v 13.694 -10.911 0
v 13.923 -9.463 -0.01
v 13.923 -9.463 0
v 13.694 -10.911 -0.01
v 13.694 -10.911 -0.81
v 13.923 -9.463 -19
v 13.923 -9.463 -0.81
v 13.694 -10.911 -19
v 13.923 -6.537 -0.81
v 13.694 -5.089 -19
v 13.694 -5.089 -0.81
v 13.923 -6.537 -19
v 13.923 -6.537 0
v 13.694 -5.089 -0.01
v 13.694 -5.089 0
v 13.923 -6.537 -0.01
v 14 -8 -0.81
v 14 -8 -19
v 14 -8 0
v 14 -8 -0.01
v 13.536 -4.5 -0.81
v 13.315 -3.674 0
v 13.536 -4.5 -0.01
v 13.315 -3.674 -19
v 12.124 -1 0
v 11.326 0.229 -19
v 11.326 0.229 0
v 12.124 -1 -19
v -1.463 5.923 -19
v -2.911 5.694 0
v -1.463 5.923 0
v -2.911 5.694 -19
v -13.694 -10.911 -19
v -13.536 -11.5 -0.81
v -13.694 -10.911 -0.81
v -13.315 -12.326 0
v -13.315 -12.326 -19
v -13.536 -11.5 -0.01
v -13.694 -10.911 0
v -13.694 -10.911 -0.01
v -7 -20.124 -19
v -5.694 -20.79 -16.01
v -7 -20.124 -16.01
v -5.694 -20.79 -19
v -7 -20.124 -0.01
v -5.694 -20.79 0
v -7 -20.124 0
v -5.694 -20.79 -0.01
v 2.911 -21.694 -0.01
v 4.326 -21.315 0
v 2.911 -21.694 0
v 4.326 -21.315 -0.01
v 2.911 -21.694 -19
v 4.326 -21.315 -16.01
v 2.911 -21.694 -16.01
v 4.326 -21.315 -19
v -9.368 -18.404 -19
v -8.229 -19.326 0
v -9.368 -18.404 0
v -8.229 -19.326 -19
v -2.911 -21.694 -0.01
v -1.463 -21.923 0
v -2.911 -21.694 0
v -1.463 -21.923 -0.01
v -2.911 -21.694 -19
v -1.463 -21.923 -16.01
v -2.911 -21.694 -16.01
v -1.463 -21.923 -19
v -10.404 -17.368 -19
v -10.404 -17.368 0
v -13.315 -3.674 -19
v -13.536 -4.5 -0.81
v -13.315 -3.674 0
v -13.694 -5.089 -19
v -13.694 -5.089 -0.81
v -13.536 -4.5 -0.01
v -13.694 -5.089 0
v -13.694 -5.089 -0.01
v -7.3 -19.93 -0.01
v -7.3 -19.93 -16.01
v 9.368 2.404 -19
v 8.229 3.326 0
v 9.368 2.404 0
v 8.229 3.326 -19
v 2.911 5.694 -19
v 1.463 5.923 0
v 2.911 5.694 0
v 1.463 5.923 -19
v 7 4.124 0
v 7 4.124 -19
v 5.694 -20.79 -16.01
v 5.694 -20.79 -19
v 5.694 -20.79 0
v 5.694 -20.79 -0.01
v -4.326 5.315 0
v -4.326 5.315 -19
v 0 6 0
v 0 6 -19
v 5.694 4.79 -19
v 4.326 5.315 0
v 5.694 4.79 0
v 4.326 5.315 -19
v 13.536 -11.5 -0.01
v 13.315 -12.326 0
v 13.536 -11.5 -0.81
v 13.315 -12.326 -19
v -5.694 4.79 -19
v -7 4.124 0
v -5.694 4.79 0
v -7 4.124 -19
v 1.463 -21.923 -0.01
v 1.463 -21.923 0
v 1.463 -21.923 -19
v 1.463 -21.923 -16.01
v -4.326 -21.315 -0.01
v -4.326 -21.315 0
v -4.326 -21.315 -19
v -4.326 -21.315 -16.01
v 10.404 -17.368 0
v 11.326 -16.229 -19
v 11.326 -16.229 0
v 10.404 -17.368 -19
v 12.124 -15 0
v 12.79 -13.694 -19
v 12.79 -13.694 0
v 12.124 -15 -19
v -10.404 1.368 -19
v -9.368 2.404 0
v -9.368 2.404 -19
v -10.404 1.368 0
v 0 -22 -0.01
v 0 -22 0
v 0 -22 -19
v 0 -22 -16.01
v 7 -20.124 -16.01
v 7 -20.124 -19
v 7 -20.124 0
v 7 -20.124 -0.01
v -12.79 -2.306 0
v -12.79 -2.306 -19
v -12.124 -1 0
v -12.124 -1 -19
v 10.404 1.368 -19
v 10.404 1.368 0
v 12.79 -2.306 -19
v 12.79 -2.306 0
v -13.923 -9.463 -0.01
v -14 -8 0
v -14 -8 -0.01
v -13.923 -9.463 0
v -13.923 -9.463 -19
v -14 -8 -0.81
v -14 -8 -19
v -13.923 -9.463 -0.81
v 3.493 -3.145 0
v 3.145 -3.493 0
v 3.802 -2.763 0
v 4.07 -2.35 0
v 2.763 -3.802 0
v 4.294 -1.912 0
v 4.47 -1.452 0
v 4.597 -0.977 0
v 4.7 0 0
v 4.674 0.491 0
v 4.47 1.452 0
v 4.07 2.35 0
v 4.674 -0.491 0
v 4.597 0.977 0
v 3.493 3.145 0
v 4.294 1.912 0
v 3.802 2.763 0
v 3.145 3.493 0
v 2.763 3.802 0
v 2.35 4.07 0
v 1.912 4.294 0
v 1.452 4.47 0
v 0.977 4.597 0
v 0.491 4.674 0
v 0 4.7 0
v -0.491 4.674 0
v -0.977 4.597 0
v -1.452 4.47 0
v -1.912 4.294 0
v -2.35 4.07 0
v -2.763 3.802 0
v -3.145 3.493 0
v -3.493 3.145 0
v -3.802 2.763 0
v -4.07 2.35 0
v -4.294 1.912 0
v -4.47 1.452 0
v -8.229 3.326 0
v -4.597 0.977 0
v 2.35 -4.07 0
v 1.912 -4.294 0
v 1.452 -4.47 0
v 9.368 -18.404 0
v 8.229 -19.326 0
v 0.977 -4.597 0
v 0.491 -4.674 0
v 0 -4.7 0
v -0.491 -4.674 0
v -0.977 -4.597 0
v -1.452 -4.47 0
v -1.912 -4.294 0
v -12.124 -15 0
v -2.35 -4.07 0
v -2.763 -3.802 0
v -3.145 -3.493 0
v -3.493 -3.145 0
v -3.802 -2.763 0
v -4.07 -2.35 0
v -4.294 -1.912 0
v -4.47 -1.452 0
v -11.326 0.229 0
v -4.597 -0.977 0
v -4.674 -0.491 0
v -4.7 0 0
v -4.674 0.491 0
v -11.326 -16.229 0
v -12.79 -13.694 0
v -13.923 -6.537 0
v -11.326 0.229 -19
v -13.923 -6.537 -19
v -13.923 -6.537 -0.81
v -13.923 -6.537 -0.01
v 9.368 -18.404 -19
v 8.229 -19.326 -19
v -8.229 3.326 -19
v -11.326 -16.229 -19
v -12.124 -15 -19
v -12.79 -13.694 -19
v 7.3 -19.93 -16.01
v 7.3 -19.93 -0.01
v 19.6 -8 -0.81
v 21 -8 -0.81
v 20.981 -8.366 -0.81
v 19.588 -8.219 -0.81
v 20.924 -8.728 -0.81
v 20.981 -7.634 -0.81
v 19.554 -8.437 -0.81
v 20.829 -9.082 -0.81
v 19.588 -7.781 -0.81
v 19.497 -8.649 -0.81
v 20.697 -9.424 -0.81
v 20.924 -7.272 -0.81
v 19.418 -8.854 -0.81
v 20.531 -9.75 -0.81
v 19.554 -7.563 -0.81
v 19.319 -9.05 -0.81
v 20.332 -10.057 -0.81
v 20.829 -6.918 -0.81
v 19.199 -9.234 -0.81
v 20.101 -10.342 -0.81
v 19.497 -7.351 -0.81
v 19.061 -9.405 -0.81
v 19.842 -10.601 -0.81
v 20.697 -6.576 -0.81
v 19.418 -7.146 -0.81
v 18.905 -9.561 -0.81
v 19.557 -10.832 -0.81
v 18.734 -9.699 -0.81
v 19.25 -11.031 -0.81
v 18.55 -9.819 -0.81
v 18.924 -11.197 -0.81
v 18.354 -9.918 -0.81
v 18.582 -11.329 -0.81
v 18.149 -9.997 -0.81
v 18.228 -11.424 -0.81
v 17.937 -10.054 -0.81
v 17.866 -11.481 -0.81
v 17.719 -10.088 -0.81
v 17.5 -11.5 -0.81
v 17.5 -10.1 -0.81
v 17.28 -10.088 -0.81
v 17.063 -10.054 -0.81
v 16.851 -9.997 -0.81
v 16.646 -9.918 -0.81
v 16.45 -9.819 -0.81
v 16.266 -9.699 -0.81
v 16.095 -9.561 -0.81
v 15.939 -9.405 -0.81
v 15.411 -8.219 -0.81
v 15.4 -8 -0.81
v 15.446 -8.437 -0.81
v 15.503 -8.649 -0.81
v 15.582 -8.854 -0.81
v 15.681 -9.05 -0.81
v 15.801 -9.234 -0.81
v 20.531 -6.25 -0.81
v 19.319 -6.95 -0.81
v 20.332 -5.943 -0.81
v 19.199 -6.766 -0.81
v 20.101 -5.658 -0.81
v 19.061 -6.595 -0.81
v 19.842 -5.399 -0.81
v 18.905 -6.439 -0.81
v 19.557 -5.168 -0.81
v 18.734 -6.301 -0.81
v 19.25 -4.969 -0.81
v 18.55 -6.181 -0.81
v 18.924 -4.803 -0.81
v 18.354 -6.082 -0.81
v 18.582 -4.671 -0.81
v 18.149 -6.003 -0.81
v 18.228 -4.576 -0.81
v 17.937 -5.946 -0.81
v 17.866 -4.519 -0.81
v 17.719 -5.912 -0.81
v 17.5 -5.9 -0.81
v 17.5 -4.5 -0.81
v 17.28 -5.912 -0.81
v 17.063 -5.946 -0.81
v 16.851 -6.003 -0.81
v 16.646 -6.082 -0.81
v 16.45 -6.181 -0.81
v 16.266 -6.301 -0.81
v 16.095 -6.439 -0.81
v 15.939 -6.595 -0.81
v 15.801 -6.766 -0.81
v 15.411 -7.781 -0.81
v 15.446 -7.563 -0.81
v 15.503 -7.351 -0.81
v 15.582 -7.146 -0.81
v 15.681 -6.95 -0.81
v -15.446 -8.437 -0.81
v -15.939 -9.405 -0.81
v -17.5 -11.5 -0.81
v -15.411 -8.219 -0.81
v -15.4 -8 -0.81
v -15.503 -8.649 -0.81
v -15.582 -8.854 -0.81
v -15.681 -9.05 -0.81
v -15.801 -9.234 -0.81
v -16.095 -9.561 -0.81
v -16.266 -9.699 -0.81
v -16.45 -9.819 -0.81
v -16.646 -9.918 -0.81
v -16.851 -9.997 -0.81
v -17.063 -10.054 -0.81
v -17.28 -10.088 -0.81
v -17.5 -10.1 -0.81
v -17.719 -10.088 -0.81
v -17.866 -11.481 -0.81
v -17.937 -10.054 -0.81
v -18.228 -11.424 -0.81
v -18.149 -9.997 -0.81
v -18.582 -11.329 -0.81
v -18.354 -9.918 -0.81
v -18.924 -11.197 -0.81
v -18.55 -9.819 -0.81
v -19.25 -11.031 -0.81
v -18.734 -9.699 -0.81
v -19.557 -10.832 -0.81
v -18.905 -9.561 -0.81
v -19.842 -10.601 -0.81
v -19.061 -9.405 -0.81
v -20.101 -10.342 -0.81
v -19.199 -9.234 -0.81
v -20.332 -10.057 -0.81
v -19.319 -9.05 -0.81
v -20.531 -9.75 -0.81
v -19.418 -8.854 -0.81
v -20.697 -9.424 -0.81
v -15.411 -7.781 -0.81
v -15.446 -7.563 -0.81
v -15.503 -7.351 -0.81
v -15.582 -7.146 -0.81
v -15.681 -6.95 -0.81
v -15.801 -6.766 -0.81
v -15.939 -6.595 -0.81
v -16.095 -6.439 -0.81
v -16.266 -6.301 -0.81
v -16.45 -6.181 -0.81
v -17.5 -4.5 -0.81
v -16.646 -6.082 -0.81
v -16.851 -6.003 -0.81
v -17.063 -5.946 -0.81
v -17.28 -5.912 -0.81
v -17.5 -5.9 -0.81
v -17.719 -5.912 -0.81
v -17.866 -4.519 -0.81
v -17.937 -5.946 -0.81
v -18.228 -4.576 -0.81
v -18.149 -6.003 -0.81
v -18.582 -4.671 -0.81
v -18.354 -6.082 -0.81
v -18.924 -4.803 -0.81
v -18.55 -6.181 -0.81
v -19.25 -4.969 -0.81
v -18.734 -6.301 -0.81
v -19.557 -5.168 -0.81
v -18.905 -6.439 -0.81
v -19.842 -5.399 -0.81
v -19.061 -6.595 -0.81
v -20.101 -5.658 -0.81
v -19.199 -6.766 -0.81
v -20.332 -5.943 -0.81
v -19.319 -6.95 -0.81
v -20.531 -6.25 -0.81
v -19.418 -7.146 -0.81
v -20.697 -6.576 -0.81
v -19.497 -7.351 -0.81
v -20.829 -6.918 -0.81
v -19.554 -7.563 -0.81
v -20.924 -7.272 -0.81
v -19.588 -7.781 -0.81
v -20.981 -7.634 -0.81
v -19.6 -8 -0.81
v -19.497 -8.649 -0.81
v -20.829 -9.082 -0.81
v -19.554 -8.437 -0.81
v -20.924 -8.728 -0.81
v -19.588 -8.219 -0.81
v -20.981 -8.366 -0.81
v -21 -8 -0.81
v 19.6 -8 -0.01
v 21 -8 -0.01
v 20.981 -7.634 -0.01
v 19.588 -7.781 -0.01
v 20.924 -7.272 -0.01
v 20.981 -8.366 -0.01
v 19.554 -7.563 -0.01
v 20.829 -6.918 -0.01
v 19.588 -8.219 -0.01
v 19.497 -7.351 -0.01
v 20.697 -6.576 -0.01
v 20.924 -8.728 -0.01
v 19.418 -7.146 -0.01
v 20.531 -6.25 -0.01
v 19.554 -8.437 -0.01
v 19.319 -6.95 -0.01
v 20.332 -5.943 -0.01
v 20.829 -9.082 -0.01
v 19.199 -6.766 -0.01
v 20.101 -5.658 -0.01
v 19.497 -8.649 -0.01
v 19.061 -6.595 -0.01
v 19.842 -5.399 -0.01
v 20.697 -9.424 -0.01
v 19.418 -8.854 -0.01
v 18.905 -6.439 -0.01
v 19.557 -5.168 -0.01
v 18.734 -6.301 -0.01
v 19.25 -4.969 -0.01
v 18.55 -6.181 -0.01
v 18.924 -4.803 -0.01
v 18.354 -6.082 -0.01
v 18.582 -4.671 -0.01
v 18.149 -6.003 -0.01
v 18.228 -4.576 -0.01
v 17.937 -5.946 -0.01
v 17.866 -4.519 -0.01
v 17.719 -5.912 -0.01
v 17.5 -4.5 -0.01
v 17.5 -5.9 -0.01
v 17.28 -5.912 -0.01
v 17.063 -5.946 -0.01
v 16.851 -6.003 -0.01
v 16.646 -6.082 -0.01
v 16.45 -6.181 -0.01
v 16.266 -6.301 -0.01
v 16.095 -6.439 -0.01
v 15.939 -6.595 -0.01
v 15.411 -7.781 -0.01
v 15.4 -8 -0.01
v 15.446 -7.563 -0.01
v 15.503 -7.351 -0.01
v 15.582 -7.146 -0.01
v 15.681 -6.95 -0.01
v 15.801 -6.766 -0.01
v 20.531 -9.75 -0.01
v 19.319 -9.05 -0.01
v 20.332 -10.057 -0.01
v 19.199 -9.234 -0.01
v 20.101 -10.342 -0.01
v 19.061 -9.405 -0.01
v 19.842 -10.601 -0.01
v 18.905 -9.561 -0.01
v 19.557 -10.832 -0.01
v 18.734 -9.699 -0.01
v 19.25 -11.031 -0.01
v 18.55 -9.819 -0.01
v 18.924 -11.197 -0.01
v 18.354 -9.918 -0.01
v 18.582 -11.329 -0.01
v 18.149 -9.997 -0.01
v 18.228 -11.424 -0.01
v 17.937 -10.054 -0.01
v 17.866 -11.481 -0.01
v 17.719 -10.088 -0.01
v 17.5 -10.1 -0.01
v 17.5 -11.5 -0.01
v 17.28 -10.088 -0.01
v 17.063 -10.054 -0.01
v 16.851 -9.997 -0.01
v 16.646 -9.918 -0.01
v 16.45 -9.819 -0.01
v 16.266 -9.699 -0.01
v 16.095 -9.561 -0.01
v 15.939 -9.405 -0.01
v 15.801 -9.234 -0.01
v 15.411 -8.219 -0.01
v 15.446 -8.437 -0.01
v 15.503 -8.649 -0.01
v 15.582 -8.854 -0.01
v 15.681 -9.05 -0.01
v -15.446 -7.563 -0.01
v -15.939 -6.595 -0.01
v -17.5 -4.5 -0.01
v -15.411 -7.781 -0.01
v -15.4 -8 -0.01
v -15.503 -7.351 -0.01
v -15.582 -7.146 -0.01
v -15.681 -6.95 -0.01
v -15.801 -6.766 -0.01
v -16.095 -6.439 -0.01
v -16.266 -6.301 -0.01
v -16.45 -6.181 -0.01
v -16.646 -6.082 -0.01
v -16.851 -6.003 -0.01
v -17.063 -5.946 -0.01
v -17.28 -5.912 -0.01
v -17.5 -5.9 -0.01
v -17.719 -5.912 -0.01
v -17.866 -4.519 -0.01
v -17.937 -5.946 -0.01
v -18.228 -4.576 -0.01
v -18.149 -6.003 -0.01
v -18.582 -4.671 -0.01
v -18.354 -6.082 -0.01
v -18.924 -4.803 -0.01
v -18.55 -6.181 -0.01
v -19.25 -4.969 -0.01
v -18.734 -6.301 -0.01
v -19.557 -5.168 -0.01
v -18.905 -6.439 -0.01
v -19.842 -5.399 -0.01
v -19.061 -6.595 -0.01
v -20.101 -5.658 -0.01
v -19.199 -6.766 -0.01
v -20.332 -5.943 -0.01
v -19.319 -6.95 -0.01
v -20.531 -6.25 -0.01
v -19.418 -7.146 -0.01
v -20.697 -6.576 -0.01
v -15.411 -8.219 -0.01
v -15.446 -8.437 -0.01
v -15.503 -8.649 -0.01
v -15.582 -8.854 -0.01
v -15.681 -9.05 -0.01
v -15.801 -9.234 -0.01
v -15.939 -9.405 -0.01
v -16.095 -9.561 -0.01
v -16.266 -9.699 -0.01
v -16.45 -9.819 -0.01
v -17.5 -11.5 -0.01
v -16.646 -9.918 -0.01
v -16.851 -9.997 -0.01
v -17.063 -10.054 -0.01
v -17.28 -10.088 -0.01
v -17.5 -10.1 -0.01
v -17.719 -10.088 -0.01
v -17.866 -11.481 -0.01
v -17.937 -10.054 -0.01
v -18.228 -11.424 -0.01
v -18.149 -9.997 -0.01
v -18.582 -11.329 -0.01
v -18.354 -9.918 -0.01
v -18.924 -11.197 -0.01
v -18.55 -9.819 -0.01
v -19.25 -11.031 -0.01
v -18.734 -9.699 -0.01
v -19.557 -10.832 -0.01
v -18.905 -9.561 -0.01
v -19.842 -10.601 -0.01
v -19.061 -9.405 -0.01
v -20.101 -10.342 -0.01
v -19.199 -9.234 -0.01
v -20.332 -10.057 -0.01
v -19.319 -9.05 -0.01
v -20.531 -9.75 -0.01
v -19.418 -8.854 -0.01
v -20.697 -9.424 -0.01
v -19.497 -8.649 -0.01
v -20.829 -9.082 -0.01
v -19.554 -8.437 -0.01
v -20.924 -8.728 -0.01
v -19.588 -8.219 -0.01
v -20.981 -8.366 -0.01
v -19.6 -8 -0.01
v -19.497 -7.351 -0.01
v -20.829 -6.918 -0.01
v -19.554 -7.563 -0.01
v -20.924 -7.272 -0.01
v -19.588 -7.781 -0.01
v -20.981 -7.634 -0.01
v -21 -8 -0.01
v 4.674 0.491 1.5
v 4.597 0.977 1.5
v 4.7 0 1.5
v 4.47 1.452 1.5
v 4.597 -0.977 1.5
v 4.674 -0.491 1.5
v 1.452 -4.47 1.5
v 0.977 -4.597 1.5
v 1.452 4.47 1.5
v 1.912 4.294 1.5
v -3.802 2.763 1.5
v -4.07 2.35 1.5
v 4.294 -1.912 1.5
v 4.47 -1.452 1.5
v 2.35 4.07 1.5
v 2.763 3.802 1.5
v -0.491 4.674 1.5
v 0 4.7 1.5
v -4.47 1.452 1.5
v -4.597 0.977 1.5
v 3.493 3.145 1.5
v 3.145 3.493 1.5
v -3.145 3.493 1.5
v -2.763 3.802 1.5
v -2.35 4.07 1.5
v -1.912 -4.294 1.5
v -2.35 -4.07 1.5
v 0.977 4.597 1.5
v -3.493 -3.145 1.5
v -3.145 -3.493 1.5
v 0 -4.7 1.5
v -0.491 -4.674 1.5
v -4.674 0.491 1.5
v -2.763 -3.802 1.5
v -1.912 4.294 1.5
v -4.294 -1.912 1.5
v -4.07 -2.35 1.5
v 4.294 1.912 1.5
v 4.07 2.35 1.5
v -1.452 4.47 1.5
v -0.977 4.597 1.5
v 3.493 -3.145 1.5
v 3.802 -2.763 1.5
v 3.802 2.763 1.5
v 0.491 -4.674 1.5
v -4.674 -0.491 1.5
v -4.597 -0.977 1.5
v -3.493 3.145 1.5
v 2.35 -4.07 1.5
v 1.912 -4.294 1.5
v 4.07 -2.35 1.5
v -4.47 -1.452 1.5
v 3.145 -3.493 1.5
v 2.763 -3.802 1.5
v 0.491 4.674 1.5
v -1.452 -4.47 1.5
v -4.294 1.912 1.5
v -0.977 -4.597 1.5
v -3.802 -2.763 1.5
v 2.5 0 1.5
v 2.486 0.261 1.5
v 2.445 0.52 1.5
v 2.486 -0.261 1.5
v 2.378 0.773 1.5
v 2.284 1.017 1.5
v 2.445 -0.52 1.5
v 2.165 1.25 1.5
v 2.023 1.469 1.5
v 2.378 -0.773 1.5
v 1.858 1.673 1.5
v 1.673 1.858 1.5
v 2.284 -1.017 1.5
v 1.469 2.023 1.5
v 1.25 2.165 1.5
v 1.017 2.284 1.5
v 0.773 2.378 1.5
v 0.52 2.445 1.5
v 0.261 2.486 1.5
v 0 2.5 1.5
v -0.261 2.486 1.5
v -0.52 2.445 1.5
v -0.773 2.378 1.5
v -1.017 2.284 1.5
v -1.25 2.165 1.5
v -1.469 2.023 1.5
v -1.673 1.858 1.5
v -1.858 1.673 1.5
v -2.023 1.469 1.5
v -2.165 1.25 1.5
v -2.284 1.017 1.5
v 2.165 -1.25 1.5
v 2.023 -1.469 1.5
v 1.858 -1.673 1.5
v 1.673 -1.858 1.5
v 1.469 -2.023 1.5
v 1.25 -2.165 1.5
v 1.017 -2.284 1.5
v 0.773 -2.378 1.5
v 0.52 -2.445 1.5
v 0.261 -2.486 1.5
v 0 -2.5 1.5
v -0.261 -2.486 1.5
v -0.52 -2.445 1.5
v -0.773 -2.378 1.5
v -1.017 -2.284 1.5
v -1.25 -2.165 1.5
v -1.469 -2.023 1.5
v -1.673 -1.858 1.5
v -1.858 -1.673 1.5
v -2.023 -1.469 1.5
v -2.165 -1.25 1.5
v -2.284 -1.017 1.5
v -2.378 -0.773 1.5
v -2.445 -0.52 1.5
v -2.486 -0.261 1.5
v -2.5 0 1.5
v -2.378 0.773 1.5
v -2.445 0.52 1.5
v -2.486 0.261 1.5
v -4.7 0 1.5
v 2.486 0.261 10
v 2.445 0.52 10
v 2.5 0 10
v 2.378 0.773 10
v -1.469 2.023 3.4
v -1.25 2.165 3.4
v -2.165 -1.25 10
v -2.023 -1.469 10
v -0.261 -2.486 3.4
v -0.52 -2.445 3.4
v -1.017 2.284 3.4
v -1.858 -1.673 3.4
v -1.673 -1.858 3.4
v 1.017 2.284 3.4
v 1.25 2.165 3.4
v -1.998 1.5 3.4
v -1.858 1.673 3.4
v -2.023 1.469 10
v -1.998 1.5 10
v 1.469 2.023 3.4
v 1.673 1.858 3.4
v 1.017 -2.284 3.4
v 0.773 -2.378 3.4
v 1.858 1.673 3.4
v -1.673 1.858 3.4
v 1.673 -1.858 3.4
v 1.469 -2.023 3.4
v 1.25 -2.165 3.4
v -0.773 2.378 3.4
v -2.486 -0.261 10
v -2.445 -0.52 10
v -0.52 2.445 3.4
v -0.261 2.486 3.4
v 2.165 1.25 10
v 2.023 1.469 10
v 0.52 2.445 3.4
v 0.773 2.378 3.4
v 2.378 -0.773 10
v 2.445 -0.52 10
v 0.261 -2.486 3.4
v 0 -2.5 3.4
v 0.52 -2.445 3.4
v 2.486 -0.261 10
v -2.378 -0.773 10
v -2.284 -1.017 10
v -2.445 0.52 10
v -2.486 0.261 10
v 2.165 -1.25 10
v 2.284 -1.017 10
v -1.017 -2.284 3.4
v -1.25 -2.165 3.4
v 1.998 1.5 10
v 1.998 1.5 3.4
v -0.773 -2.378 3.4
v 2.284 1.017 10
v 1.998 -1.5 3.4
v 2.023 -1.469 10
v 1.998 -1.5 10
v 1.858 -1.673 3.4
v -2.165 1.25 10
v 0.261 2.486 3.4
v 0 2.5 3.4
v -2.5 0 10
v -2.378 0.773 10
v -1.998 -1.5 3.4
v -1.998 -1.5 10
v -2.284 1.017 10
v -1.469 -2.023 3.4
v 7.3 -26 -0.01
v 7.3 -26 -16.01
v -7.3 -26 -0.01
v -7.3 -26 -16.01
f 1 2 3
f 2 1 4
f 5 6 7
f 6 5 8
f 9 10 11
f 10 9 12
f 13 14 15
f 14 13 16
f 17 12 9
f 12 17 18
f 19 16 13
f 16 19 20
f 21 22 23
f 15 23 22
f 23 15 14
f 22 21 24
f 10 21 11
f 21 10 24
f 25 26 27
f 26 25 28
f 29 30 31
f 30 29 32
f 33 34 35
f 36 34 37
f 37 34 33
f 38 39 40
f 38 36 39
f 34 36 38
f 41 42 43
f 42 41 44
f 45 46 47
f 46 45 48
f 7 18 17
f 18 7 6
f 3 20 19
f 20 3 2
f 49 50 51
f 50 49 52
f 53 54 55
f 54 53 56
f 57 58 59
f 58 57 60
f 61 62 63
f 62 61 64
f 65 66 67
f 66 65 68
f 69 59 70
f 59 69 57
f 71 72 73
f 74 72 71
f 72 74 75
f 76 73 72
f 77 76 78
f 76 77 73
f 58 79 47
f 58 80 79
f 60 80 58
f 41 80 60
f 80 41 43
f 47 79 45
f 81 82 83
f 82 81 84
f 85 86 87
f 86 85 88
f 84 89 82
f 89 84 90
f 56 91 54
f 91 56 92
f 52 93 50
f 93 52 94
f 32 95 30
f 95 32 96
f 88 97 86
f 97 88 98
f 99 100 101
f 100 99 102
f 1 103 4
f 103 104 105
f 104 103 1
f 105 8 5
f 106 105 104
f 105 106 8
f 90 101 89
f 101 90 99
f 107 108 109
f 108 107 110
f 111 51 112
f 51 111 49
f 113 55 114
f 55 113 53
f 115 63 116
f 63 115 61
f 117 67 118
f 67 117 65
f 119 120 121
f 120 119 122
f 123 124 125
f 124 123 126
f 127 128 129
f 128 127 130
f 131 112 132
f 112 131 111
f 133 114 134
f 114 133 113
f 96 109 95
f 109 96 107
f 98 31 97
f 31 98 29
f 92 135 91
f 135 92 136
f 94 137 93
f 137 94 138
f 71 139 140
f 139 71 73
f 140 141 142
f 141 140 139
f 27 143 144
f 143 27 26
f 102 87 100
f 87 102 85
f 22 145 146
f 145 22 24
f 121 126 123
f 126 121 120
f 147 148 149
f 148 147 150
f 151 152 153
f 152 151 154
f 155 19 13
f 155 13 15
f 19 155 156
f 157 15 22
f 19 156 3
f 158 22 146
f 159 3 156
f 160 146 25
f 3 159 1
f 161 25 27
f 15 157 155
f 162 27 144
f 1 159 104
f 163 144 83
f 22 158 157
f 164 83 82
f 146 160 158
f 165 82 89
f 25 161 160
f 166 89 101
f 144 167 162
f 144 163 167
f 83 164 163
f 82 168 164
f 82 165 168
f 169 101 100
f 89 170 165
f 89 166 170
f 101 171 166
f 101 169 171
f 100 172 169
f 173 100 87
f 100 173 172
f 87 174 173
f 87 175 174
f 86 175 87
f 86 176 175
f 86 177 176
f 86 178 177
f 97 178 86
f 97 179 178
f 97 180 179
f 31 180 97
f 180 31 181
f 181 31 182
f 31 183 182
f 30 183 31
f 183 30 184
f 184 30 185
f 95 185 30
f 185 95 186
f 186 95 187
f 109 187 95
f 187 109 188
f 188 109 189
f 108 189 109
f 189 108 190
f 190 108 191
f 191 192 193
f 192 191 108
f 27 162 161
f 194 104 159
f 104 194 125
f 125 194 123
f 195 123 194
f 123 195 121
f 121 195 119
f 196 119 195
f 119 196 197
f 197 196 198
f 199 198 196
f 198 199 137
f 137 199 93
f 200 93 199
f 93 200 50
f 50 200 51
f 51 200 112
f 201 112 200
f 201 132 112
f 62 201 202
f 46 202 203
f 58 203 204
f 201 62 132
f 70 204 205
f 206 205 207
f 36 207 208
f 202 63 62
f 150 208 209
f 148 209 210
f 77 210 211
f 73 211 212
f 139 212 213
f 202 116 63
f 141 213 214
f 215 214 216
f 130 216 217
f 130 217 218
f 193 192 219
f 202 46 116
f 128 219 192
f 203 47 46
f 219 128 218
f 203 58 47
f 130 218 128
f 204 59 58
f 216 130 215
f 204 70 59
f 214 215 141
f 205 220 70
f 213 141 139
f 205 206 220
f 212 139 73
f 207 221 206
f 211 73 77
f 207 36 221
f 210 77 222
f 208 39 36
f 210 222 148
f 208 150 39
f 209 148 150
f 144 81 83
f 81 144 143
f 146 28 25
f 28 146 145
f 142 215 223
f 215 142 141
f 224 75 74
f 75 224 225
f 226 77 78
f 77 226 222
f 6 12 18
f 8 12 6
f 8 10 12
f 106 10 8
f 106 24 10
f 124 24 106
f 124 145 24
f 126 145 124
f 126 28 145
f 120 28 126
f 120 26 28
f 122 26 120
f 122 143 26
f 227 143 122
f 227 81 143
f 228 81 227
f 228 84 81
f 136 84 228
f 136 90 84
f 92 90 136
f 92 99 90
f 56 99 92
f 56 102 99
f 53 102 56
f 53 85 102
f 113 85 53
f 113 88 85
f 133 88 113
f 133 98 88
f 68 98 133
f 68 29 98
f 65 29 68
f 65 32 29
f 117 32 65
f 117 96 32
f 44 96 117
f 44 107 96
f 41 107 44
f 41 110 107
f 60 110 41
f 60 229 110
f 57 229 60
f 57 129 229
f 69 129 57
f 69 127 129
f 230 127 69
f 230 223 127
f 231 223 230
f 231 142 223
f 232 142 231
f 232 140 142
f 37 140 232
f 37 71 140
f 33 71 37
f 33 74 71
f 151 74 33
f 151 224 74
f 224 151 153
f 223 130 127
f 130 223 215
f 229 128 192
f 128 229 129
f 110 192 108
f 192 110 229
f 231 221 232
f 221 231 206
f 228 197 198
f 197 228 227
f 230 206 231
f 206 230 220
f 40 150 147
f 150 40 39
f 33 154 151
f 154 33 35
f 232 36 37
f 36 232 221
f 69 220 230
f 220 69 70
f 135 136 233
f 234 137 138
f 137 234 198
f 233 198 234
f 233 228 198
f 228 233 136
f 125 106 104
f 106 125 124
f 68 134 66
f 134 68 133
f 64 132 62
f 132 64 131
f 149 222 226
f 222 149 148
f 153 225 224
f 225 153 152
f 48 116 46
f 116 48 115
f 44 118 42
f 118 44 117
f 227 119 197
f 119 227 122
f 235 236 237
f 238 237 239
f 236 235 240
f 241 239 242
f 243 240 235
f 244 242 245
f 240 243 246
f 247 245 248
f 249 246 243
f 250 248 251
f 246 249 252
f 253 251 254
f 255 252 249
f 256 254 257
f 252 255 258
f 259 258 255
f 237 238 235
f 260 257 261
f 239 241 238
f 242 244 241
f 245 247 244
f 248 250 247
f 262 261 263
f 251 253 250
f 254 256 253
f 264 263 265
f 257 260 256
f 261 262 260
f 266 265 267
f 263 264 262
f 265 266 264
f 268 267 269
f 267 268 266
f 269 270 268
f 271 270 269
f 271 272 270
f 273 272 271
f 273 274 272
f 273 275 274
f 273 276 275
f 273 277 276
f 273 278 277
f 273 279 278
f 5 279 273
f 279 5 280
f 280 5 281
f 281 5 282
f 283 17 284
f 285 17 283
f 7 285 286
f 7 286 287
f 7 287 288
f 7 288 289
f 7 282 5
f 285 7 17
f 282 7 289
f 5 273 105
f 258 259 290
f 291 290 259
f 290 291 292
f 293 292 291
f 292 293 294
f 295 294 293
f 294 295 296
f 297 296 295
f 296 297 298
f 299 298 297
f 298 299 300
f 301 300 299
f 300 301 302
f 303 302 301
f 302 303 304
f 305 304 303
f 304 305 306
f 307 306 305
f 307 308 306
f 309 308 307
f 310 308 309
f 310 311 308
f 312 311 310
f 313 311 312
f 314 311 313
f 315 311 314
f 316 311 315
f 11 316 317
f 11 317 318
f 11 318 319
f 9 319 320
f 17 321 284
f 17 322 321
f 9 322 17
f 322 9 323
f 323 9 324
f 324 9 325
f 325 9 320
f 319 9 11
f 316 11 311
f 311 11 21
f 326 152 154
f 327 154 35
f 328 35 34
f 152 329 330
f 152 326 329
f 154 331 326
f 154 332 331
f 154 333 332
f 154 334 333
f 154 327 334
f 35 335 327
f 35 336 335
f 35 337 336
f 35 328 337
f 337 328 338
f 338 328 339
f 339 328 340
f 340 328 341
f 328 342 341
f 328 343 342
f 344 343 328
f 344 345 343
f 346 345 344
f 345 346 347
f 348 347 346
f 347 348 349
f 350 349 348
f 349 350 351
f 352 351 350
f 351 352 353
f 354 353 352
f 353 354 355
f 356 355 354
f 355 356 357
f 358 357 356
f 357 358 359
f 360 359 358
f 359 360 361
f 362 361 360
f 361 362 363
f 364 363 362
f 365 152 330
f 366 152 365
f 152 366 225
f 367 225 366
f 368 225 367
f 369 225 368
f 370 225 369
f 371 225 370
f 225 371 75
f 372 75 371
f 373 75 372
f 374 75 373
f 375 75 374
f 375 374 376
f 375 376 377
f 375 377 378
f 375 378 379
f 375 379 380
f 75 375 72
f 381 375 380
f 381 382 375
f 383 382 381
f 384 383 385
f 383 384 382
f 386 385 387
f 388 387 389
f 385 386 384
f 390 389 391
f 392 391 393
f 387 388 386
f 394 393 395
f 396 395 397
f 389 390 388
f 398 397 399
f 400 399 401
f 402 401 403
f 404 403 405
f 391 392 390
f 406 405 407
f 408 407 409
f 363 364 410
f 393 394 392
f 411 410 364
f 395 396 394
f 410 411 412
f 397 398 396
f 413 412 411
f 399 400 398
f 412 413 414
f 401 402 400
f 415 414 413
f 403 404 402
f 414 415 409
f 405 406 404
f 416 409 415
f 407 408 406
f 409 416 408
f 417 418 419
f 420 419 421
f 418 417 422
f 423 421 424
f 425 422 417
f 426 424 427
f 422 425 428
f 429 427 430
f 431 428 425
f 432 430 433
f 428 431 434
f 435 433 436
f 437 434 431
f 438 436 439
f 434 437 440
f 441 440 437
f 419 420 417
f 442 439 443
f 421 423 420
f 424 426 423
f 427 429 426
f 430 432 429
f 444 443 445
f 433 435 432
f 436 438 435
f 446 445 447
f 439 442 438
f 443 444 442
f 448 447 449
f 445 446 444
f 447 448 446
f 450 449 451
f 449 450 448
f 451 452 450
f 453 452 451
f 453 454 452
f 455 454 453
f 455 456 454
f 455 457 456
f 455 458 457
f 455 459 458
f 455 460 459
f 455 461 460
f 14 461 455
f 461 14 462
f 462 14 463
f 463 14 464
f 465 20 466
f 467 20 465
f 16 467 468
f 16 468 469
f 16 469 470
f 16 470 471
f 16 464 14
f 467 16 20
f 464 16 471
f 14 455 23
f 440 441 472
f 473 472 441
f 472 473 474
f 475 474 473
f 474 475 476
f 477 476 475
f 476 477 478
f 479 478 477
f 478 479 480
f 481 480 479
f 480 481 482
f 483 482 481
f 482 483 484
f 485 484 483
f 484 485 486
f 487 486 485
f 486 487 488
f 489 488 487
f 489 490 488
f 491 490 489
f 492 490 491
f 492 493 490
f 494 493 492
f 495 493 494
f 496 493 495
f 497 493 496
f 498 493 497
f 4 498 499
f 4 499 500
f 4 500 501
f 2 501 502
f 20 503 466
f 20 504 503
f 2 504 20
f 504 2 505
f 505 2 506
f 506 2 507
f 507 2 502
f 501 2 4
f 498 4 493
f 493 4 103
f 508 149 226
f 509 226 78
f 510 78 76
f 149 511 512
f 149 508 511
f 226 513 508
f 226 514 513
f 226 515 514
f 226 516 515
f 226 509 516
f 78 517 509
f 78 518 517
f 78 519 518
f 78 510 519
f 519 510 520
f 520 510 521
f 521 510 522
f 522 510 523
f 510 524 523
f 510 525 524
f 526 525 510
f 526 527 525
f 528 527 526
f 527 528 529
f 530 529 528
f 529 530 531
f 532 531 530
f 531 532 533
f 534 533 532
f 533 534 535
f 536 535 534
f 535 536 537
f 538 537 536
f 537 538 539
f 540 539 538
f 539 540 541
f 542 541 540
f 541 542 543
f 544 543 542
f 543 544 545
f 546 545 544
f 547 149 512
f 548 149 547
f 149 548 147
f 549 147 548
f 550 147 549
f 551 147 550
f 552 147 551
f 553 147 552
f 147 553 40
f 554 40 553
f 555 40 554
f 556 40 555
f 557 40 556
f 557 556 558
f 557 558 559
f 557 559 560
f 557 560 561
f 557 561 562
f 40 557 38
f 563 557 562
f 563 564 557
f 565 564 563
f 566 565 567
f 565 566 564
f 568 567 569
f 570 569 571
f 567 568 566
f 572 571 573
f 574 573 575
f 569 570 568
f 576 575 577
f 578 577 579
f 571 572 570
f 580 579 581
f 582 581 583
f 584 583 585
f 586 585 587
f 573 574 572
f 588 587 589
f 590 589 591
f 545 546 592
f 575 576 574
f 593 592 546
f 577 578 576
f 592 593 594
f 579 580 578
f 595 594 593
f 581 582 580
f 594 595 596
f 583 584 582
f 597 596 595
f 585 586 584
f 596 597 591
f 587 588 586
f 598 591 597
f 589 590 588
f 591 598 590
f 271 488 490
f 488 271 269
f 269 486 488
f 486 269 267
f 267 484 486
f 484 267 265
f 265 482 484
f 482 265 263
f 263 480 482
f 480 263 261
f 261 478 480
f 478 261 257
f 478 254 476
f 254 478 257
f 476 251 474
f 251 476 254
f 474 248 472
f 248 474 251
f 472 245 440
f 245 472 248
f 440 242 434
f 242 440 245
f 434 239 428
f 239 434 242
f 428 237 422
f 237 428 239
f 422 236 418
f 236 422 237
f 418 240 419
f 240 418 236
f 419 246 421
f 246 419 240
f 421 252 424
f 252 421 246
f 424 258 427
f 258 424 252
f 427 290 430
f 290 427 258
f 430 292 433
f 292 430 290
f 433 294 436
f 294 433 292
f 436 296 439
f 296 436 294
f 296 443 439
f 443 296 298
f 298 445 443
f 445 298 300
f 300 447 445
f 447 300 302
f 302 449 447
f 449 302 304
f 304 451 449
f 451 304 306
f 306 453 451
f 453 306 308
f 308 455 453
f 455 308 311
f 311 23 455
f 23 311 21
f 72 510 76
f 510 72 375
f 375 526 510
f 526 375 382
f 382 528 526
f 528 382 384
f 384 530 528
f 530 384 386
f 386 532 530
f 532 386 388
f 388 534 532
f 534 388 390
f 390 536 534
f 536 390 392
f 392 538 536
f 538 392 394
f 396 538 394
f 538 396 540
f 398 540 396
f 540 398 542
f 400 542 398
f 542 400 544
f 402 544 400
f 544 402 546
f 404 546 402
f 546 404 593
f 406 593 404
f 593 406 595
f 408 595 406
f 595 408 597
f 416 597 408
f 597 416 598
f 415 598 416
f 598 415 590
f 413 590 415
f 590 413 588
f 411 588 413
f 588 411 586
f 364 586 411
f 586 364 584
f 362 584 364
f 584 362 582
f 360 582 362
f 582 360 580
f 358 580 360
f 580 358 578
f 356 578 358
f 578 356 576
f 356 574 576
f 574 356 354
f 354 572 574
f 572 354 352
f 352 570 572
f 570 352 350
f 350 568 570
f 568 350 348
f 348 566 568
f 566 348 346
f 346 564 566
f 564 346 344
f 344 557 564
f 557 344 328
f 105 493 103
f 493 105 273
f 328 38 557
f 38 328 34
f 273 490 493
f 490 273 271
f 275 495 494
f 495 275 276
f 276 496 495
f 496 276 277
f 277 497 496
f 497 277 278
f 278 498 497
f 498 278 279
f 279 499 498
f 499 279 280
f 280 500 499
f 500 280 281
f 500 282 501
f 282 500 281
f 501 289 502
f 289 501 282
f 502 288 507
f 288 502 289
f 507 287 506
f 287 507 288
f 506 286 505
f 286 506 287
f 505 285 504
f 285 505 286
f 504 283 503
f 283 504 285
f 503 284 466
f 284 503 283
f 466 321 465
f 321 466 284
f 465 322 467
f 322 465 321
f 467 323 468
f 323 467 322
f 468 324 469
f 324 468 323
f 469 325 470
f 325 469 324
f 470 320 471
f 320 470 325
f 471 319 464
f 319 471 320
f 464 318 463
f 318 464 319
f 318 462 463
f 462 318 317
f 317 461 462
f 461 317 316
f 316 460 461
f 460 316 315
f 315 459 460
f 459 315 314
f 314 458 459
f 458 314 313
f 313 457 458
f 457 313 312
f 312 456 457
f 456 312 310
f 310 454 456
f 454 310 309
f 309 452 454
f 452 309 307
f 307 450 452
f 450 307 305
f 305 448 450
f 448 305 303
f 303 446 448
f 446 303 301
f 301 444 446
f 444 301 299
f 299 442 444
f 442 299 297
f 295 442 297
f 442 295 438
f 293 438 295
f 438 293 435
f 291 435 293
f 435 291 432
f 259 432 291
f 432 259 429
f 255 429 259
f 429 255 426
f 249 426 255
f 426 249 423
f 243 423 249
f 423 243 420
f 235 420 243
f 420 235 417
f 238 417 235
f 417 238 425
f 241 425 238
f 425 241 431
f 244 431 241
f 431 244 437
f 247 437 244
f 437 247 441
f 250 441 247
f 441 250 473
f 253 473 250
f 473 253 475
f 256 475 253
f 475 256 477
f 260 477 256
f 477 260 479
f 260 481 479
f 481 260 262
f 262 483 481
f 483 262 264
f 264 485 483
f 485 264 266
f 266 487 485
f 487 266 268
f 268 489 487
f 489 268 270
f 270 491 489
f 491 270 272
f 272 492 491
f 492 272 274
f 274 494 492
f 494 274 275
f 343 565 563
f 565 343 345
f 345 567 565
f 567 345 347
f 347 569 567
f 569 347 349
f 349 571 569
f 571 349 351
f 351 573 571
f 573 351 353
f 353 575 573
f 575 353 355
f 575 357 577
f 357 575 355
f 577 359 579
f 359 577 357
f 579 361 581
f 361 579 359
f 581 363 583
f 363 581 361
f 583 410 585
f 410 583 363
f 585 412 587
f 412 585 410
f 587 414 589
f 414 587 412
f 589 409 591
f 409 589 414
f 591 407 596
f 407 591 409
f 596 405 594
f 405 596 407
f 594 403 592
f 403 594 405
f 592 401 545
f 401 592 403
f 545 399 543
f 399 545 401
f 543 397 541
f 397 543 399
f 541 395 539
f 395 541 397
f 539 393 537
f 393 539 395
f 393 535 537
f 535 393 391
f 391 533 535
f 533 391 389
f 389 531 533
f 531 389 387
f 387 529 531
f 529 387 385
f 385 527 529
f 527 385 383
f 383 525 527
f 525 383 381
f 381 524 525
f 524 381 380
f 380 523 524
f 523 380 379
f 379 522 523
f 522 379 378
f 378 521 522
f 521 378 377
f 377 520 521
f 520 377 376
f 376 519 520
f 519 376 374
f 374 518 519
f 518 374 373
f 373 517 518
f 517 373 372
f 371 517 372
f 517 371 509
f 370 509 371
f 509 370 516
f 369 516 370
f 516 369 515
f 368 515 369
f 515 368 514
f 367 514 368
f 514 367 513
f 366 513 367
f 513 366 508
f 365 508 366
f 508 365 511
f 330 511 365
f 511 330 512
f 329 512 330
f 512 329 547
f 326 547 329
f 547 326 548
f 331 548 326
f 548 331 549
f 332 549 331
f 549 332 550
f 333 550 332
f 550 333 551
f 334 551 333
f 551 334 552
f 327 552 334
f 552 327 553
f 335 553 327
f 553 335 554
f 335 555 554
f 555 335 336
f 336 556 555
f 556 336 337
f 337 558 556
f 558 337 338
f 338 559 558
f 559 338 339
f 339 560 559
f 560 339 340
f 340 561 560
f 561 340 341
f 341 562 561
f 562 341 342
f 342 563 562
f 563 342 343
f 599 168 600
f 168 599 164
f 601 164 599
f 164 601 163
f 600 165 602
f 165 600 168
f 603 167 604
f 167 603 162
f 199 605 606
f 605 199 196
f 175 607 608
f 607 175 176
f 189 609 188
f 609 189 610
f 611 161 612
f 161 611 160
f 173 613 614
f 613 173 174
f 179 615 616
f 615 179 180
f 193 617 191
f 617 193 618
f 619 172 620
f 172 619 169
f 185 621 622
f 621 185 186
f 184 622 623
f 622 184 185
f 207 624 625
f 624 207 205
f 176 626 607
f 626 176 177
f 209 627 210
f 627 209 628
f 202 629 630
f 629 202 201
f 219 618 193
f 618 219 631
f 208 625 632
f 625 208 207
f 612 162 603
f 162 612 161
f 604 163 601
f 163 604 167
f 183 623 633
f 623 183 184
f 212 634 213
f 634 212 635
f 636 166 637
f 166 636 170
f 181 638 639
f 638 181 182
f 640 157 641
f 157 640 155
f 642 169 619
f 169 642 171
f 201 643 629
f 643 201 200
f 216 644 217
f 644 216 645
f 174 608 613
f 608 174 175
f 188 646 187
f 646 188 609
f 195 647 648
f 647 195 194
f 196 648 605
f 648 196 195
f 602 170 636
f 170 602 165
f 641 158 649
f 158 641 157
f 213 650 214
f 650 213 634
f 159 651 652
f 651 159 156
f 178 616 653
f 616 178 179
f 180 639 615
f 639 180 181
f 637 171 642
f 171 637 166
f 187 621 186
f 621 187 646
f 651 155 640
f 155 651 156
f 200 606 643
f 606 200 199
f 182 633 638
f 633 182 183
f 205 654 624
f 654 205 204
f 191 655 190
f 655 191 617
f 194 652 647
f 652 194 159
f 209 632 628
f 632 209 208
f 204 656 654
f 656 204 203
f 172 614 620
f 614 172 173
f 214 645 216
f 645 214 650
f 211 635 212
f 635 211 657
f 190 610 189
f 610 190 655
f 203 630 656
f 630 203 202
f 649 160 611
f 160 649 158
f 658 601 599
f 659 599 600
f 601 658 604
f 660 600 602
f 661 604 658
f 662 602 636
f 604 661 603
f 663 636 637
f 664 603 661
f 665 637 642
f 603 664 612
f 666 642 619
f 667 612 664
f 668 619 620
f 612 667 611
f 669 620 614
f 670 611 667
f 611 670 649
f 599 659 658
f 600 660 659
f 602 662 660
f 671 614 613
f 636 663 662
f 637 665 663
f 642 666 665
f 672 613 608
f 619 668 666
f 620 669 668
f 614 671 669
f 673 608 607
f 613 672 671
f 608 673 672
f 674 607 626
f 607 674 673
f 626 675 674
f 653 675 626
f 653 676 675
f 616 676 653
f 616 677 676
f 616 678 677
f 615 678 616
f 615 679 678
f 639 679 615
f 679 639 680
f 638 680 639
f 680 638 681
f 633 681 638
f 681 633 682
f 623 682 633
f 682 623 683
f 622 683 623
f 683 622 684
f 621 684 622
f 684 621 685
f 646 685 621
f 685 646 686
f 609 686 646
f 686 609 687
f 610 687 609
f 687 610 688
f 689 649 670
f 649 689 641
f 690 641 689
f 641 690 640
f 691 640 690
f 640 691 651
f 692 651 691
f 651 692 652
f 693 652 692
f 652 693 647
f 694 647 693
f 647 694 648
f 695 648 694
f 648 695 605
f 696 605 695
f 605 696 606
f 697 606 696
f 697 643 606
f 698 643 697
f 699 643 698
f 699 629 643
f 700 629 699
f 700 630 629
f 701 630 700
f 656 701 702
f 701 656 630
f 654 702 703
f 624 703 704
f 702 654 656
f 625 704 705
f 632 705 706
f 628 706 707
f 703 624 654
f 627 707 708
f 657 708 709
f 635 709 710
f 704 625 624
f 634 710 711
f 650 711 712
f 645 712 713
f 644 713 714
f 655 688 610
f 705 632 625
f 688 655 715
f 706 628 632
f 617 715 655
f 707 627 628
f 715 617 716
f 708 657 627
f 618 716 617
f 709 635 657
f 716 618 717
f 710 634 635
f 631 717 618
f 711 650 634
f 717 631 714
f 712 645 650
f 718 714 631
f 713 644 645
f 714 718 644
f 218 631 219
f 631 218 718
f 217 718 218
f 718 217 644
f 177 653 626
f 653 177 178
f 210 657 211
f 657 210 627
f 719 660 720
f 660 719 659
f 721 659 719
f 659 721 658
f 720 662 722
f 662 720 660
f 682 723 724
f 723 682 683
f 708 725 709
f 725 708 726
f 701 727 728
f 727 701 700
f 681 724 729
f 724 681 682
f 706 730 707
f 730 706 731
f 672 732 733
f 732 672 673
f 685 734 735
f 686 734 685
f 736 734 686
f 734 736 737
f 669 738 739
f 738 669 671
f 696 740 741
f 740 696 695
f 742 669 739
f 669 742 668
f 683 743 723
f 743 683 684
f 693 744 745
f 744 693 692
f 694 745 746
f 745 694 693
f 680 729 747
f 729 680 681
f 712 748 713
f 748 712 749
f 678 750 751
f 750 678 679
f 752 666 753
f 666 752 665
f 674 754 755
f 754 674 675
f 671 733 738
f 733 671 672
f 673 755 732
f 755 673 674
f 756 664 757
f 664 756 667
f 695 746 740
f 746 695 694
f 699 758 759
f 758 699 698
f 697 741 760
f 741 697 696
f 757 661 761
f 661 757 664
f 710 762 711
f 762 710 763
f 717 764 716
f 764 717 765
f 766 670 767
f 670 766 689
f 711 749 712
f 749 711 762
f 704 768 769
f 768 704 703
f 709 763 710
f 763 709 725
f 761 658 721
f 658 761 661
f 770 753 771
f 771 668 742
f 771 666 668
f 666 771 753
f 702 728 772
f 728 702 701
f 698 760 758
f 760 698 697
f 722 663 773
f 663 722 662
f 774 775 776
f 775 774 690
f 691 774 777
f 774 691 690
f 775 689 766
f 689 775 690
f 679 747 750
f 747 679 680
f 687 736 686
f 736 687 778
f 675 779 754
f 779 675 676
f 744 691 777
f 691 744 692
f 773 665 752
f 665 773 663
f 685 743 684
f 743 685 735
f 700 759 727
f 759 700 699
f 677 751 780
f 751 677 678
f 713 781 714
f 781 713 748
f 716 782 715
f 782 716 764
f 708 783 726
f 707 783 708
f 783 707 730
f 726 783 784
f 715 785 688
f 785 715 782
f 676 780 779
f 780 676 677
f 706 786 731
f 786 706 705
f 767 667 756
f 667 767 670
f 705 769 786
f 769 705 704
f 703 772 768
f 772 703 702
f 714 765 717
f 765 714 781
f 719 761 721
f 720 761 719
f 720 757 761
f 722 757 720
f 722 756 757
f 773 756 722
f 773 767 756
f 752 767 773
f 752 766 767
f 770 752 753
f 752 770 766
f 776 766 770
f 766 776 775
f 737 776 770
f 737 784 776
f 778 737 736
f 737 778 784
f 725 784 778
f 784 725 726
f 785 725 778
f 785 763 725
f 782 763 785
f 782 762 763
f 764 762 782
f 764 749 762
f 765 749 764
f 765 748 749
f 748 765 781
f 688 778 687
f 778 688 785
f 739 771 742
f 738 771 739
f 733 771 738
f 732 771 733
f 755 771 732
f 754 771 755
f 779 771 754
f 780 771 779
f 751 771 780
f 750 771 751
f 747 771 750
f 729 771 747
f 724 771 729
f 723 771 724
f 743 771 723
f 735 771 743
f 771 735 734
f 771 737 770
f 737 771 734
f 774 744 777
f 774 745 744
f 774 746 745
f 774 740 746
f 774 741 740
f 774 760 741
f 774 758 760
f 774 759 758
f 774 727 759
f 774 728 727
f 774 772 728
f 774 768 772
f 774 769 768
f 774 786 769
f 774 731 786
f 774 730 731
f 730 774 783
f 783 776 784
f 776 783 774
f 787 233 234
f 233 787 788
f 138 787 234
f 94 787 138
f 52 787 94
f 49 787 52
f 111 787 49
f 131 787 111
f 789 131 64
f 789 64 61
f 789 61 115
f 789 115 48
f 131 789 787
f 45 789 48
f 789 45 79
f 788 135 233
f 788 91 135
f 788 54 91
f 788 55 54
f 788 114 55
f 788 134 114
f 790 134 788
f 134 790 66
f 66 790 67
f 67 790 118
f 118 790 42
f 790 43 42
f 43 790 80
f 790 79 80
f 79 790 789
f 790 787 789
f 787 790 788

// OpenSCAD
/*
   Copyright 2015-2018 Scott Bezek and the splitflap contributors

   Licensed under the Apache License, Version 2.0 (the "License");
   you may not use this file except in compliance with the License.
   You may obtain a copy of the License at

       http://www.apache.org/licenses/LICENSE-2.0

   Unless required by applicable law or agreed to in writing, software
   distributed under the License is distributed on an "AS IS" BASIS,
   WITHOUT WARRANTIES OR CONDITIONS OF ANY KIND, either express or implied.
   See the License for the specific language governing permissions and
   limitations under the License.
*/

28byj48_chassis_radius = 28/2;
28byj48_chassis_height = 19;
28byj48_shaft_offset = 8;
28byj48_mount_outer_radius = 3.5;
28byj48_mount_hole_radius = 4.2/2;
28byj48_mount_center_offset = 35/2;
28byj48_mount_bracket_height = 0.8;

28byj48_shaft_collar_radius = 9.4/2;
28byj48_shaft_collar_height = 1.5;

28byj48_shaft_radius = 5/2;
28byj48_shaft_height = 10;
28byj48_shaft_slotted_width = 3;
28byj48_shaft_slotted_height = 6.6;

28byj48_backpack_width = 14.6;
28byj48_backpack_extent = 18; // seen values from 17-18
28byj48_backpack_height = 16;

// Exports for use in other files:
function 28byj48_mount_bracket_height() = 28byj48_mount_bracket_height;
function 28byj48_shaft_radius() = 28byj48_shaft_radius;
function 28byj48_shaft_collar_radius() = 28byj48_shaft_collar_radius;
function 28byj48_shaft_collar_height() = 28byj48_shaft_collar_height;
function 28byj48_mount_center_offset() = 28byj48_mount_center_offset;
function 28byj48_chassis_radius() = 28byj48_chassis_radius;
function 28byj48_shaft_offset() = 28byj48_shaft_offset;
function 28byj48_chassis_height() = 28byj48_chassis_height;
function 28byj48_backpack_extent() = 28byj48_backpack_extent;
function 28byj48_shaft_height() = 28byj48_shaft_height;
function 28byj48_shaft_slotted_height() = 28byj48_shaft_slotted_height;

// Basic 28BYJ-48 model based on various dimensioned drawings.
// Origin is centered on the shaft, on the front face of the motor, with the shaft in the +z direction
module Stepper28BYJ48() {
    $fn = 60;

    eps = 0.01;

    gray = [0.7, 0.7, 0.7];
    gold = [1, 0.843, 0];
    blue = [0, 0, 1];

    module mounting_holes() {
        linear_extrude(height=28byj48_mount_bracket_height) {
        difference() {
            hull() {
                translate([28byj48_mount_center_offset, 0]) {
                    circle(r=28byj48_mount_outer_radius);
                }
                translate([-28byj48_mount_center_offset, 0]) {
                    circle(r=28byj48_mount_outer_radius);
                }
            }

            translate([28byj48_mount_center_offset, 0]) {
                circle(r=28byj48_mount_hole_radius);
            }
            translate([-28byj48_mount_center_offset, 0]) {
                circle(r=28byj48_mount_hole_radius);
            }
        }
        }
    }

    module shaft_collar() {
        cylinder(r=28byj48_shaft_collar_radius, h=28byj48_shaft_collar_height + eps);
    }

    module shaft() {
        color(gold) {
            difference() {
                cylinder(r=28byj48_shaft_radius, h=28byj48_shaft_height);
                translate([-(28byj48_shaft_radius + eps), 28byj48_shaft_slotted_width / 2, 28byj48_shaft_height - 28byj48_shaft_slotted_height]) {
                    cube([(28byj48_shaft_radius+eps)*2, 28byj48_shaft_radius, 28byj48_shaft_slotted_height+eps]);
                }
                translate([-(28byj48_shaft_radius + eps), - 28byj48_shaft_radius - (28byj48_shaft_slotted_width / 2), 28byj48_shaft_height - 28byj48_shaft_slotted_height]) {
                    cube([(28byj48_shaft_radius+eps)*2, 28byj48_shaft_radius, 28byj48_shaft_slotted_height+eps]);
                }
            }
        }
    }

    module chassis() {
        color(gray) {
            translate([0, 0, -28byj48_chassis_height]) {
                cylinder(r=28byj48_chassis_radius, h=28byj48_chassis_height);
            }
            translate([0, 0, -28byj48_mount_bracket_height - eps]) {
                mounting_holes();
            }
            translate([0, 28byj48_shaft_offset, -eps]) {
                shaft_collar();
            }
        }
    }

    module backpack() {
        color(blue) {
            translate([-28byj48_backpack_width/2, 0, -28byj48_backpack_height - eps]) {
                cube([28byj48_backpack_width, 28byj48_backpack_extent, 28byj48_backpack_height]);
            }
        }
    }

    translate([0, -28byj48_shaft_offset, 0]) {
        chassis();
        translate([0, 28byj48_shaft_offset, 0]) {
            shaft();
        }
        translate([0, -28byj48_backpack_extent, 0]) {
            backpack();
        }
    }
}

// Example usage:
Stepper28BYJ48();
